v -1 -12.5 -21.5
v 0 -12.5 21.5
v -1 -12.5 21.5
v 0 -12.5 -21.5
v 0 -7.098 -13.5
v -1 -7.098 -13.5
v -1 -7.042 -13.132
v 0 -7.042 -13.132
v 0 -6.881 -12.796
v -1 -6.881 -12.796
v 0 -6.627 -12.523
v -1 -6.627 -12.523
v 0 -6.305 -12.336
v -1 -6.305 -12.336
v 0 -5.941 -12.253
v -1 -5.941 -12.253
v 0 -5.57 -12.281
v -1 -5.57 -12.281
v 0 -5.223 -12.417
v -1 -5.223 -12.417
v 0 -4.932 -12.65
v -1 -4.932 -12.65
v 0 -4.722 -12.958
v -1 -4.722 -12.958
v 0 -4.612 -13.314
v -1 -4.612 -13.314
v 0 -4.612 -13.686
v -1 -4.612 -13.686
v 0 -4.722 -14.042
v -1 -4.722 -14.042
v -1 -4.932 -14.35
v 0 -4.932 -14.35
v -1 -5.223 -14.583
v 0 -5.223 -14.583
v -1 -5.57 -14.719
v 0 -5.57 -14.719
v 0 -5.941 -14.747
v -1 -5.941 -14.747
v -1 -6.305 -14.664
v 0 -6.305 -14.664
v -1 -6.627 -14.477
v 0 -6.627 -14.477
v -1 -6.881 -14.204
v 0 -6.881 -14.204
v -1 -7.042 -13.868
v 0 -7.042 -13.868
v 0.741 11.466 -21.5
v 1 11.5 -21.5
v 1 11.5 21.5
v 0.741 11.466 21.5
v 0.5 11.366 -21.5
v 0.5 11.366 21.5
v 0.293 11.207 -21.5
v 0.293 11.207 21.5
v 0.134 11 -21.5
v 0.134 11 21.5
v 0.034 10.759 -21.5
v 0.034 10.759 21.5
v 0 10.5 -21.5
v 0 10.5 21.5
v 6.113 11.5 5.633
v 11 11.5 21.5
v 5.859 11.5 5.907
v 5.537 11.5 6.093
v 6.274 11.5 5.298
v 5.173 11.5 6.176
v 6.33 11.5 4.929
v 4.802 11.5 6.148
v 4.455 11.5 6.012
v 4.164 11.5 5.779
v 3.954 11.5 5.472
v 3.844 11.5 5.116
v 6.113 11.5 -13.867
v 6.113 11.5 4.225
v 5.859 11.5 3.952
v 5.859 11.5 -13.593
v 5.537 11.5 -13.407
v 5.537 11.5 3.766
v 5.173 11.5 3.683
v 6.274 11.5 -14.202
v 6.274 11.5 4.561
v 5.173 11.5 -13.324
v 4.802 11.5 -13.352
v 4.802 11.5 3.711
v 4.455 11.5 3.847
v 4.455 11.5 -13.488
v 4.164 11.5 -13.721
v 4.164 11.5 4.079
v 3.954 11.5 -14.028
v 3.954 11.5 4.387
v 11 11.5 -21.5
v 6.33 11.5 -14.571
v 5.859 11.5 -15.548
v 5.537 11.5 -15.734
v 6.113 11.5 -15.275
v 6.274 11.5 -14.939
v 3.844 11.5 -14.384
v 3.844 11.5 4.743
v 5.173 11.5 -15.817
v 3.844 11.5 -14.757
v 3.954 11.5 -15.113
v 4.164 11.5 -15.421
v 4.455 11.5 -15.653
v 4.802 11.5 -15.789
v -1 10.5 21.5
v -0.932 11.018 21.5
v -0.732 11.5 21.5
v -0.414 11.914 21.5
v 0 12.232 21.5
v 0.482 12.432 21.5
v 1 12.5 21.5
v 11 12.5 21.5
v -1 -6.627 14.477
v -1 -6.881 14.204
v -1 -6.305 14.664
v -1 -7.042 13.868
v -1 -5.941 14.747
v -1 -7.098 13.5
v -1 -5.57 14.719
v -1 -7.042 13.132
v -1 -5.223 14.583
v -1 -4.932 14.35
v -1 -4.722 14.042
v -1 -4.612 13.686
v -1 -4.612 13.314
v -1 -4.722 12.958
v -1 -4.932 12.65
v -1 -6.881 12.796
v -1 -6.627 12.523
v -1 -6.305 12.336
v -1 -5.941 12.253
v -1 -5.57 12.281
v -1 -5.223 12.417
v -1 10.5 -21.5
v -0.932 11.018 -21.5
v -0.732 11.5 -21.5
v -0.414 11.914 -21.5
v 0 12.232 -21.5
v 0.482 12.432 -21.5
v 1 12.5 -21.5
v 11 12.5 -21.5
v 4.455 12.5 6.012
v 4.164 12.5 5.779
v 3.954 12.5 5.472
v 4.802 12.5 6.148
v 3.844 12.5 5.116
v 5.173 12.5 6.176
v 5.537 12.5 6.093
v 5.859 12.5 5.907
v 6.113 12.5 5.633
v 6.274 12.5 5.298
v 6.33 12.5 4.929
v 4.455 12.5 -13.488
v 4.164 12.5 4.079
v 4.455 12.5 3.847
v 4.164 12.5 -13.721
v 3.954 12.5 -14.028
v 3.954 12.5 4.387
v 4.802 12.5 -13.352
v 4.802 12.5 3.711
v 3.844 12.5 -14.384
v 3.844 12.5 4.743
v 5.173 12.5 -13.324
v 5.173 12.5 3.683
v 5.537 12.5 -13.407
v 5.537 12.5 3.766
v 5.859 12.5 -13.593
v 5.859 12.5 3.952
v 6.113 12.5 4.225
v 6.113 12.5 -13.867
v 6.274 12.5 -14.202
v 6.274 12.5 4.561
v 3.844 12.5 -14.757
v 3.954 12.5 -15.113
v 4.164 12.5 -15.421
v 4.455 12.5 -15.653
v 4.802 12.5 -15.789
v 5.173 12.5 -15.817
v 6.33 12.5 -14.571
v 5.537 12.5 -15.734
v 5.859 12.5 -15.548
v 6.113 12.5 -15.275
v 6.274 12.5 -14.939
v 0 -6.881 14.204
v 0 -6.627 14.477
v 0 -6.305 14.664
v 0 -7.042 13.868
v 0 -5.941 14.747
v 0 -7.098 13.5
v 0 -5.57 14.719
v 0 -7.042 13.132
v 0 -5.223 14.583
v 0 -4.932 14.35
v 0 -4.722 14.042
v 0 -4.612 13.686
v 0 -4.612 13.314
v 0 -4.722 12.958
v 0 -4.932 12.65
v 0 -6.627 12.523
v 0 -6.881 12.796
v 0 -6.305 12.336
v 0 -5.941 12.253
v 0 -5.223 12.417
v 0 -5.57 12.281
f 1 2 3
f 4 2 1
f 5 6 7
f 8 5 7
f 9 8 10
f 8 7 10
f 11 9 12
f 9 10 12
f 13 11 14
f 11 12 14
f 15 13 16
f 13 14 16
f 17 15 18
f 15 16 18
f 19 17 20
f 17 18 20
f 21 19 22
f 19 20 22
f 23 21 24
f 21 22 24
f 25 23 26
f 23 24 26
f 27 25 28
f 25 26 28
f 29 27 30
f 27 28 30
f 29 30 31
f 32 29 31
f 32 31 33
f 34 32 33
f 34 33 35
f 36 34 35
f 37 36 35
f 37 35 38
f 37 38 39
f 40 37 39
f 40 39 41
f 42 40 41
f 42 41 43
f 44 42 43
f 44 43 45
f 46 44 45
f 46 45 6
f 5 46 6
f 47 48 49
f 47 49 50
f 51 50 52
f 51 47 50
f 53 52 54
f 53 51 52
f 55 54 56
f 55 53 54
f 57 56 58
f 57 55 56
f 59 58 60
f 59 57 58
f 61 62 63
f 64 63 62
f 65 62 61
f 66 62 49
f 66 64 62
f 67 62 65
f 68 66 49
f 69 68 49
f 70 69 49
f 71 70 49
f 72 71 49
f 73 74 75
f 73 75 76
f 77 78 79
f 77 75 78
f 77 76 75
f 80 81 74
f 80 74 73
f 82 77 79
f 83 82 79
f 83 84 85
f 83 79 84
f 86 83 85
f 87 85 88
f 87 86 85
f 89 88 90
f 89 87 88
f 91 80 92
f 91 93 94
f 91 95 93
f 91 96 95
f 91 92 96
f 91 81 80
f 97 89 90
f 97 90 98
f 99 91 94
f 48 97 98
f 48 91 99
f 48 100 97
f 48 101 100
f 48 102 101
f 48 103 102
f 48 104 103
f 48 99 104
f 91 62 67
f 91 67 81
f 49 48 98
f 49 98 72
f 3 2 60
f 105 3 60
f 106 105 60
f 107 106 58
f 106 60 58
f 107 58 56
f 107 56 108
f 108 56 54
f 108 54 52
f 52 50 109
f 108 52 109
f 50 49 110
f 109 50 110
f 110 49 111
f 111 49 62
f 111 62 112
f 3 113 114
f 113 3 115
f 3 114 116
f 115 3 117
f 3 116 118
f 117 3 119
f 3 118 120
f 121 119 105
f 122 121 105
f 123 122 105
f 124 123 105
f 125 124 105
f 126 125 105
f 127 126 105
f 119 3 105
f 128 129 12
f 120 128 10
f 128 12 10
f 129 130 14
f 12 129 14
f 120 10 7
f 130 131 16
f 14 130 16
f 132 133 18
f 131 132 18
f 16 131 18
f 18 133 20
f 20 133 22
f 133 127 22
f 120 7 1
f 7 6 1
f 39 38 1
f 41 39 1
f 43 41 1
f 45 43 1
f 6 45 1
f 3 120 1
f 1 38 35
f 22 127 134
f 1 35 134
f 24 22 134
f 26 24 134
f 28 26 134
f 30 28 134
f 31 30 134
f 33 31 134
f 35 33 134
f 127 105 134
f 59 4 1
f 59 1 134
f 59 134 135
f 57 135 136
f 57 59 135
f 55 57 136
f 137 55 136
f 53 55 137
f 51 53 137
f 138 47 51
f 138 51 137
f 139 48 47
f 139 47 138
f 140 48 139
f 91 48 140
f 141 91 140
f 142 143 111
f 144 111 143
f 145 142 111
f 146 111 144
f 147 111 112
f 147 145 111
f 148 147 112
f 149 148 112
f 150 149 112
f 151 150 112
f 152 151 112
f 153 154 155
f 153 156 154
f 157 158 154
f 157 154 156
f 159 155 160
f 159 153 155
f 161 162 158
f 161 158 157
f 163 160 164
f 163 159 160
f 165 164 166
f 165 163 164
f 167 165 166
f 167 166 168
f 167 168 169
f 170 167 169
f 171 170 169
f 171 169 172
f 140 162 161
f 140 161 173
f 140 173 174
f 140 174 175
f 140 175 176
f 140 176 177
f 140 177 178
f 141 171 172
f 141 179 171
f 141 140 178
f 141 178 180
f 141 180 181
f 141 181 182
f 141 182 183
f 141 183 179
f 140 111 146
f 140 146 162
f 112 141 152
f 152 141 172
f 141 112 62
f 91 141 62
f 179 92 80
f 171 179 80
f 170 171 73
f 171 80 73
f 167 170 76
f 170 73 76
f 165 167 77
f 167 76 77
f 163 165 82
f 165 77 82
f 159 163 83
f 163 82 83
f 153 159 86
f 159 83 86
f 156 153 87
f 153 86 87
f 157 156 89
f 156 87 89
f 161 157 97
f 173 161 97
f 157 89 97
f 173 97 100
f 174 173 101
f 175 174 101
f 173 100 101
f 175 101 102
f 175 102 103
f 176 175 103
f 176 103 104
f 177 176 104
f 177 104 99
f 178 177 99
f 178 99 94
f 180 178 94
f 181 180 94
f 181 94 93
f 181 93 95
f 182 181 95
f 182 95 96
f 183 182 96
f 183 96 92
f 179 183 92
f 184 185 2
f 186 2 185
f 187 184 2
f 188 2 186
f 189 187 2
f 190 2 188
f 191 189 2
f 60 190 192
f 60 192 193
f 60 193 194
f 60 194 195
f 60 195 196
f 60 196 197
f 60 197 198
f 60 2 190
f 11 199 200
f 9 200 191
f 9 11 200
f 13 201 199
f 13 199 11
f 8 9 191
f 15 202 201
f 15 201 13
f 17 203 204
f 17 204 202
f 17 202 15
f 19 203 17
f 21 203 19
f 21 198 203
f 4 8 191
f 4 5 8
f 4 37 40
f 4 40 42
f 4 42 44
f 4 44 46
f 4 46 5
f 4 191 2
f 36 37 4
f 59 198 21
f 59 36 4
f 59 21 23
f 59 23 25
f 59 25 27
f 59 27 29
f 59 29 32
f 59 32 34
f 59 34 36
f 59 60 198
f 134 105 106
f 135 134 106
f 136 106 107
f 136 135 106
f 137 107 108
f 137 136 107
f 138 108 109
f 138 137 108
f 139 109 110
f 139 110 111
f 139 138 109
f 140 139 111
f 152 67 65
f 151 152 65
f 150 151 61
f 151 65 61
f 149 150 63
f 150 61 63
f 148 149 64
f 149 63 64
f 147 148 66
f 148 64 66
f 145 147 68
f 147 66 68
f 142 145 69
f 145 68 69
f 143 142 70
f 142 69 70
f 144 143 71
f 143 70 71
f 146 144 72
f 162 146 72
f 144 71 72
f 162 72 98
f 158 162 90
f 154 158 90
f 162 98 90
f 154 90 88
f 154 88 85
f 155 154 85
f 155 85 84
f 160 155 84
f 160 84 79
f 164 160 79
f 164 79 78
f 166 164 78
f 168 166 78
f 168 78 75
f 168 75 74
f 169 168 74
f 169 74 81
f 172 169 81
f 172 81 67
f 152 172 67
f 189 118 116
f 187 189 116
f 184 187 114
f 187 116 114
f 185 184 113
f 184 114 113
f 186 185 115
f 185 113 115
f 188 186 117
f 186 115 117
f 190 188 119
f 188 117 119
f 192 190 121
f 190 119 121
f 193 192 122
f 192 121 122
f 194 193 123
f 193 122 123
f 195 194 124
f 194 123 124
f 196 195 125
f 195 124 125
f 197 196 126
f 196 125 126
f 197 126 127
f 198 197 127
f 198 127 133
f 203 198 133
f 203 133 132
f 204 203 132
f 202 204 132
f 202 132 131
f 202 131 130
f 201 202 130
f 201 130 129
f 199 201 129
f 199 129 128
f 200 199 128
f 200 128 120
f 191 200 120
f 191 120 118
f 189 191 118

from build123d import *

# Parameters (mm, degrees)
SKETCH1_W                    = 43
SKETCH1_H                    = 25
BASE_FLANGE1_DEPTH           = 1
EDGE_FLANGE1_STRIP_W         = 6
EDGE_FLANGE1_STRIP_H         = 1
EDGE_FLANGE1_STRIP_CUT_DEPTH = 43
EDGE_FLANGE1_DEPTH           = 43
TAP_DRILL_FOR_M3_TAP1_D      = 2.5
TAP_DRILL_FOR_M3_TAP2_D      = 2.5
TAP_DRILL_FOR_M3_TAP2_DEPTH  = 10
TAP_DRILL_FOR_M3_TAP2_TIP    = 0.751075774


# Sheet-metal steps are written as plain solids
with BuildPart() as part:
    # Sketch1 → Base-Flange1 (new body)
    with BuildSketch(Plane(origin=(0, 0, 0), x_dir=(0, 0, -1), z_dir=(1, 0, 0))):
        Rectangle(SKETCH1_W, SKETCH1_H)
    extrude(amount=-BASE_FLANGE1_DEPTH)

    # Edge-Flange1 strip (across the edge) → Edge-Flange1 strip cut (cut)
    with BuildSketch(Plane(origin=(0, 12.5, -21.5), x_dir=(0, -1, 0), z_dir=(0, 0, 1))):
        with Locations((-1, -0.5)):
            Rectangle(EDGE_FLANGE1_STRIP_W, EDGE_FLANGE1_STRIP_H)
    extrude(amount=EDGE_FLANGE1_STRIP_CUT_DEPTH, mode=Mode.SUBTRACT)

    # Edge-Flange1 section (across the edge) → Edge-Flange1 (add)
    with BuildSketch(Plane(origin=(0, 12.5, -21.5), x_dir=(0, -1, 0), z_dir=(0, 0, 1))):
        with BuildLine():
            Line((0, 1), (0, 11))
            Line((0, 11), (1, 11))
            Line((1, 11), (1, 1))
            ThreePointArc((1, 1), (1.292893219, 0.292893219), (2, 0))
            Line((2, 0), (2, -1))
            ThreePointArc((2, -1), (0.585786438, -0.414213562), (0, 1))
        make_face()
    extrude(amount=EDGE_FLANGE1_DEPTH)

    # Tap Drill for M3 Tap1 (through all)
    with Locations(Plane(origin=(-360.471522339, 12.5, -232.457964235), x_dir=(-1, 0, 0), z_dir=(0, 1, 0))):
        with Locations((-365.551522339, 237.387201908), (-365.551522339, 217.887201908)):
            Hole(TAP_DRILL_FOR_M3_TAP1_D / 2)

    # Tap Drill for M3 Tap2
    with Locations(Plane(origin=(2, 426.094482546, -232.457964235), x_dir=(0, 1, 0), z_dir=(1, 0, 0))):
        with Locations((-431.942500863, 218.957964235), (-431.942500863, 245.957964235)):
            Hole(TAP_DRILL_FOR_M3_TAP2_D / 2, depth=TAP_DRILL_FOR_M3_TAP2_DEPTH)
            with Locations((0, 0, -(TAP_DRILL_FOR_M3_TAP2_DEPTH + TAP_DRILL_FOR_M3_TAP2_TIP / 2))):  # 118° drill point
                Cone(0, TAP_DRILL_FOR_M3_TAP2_D / 2, TAP_DRILL_FOR_M3_TAP2_TIP, mode=Mode.SUBTRACT)


solid = part.part
